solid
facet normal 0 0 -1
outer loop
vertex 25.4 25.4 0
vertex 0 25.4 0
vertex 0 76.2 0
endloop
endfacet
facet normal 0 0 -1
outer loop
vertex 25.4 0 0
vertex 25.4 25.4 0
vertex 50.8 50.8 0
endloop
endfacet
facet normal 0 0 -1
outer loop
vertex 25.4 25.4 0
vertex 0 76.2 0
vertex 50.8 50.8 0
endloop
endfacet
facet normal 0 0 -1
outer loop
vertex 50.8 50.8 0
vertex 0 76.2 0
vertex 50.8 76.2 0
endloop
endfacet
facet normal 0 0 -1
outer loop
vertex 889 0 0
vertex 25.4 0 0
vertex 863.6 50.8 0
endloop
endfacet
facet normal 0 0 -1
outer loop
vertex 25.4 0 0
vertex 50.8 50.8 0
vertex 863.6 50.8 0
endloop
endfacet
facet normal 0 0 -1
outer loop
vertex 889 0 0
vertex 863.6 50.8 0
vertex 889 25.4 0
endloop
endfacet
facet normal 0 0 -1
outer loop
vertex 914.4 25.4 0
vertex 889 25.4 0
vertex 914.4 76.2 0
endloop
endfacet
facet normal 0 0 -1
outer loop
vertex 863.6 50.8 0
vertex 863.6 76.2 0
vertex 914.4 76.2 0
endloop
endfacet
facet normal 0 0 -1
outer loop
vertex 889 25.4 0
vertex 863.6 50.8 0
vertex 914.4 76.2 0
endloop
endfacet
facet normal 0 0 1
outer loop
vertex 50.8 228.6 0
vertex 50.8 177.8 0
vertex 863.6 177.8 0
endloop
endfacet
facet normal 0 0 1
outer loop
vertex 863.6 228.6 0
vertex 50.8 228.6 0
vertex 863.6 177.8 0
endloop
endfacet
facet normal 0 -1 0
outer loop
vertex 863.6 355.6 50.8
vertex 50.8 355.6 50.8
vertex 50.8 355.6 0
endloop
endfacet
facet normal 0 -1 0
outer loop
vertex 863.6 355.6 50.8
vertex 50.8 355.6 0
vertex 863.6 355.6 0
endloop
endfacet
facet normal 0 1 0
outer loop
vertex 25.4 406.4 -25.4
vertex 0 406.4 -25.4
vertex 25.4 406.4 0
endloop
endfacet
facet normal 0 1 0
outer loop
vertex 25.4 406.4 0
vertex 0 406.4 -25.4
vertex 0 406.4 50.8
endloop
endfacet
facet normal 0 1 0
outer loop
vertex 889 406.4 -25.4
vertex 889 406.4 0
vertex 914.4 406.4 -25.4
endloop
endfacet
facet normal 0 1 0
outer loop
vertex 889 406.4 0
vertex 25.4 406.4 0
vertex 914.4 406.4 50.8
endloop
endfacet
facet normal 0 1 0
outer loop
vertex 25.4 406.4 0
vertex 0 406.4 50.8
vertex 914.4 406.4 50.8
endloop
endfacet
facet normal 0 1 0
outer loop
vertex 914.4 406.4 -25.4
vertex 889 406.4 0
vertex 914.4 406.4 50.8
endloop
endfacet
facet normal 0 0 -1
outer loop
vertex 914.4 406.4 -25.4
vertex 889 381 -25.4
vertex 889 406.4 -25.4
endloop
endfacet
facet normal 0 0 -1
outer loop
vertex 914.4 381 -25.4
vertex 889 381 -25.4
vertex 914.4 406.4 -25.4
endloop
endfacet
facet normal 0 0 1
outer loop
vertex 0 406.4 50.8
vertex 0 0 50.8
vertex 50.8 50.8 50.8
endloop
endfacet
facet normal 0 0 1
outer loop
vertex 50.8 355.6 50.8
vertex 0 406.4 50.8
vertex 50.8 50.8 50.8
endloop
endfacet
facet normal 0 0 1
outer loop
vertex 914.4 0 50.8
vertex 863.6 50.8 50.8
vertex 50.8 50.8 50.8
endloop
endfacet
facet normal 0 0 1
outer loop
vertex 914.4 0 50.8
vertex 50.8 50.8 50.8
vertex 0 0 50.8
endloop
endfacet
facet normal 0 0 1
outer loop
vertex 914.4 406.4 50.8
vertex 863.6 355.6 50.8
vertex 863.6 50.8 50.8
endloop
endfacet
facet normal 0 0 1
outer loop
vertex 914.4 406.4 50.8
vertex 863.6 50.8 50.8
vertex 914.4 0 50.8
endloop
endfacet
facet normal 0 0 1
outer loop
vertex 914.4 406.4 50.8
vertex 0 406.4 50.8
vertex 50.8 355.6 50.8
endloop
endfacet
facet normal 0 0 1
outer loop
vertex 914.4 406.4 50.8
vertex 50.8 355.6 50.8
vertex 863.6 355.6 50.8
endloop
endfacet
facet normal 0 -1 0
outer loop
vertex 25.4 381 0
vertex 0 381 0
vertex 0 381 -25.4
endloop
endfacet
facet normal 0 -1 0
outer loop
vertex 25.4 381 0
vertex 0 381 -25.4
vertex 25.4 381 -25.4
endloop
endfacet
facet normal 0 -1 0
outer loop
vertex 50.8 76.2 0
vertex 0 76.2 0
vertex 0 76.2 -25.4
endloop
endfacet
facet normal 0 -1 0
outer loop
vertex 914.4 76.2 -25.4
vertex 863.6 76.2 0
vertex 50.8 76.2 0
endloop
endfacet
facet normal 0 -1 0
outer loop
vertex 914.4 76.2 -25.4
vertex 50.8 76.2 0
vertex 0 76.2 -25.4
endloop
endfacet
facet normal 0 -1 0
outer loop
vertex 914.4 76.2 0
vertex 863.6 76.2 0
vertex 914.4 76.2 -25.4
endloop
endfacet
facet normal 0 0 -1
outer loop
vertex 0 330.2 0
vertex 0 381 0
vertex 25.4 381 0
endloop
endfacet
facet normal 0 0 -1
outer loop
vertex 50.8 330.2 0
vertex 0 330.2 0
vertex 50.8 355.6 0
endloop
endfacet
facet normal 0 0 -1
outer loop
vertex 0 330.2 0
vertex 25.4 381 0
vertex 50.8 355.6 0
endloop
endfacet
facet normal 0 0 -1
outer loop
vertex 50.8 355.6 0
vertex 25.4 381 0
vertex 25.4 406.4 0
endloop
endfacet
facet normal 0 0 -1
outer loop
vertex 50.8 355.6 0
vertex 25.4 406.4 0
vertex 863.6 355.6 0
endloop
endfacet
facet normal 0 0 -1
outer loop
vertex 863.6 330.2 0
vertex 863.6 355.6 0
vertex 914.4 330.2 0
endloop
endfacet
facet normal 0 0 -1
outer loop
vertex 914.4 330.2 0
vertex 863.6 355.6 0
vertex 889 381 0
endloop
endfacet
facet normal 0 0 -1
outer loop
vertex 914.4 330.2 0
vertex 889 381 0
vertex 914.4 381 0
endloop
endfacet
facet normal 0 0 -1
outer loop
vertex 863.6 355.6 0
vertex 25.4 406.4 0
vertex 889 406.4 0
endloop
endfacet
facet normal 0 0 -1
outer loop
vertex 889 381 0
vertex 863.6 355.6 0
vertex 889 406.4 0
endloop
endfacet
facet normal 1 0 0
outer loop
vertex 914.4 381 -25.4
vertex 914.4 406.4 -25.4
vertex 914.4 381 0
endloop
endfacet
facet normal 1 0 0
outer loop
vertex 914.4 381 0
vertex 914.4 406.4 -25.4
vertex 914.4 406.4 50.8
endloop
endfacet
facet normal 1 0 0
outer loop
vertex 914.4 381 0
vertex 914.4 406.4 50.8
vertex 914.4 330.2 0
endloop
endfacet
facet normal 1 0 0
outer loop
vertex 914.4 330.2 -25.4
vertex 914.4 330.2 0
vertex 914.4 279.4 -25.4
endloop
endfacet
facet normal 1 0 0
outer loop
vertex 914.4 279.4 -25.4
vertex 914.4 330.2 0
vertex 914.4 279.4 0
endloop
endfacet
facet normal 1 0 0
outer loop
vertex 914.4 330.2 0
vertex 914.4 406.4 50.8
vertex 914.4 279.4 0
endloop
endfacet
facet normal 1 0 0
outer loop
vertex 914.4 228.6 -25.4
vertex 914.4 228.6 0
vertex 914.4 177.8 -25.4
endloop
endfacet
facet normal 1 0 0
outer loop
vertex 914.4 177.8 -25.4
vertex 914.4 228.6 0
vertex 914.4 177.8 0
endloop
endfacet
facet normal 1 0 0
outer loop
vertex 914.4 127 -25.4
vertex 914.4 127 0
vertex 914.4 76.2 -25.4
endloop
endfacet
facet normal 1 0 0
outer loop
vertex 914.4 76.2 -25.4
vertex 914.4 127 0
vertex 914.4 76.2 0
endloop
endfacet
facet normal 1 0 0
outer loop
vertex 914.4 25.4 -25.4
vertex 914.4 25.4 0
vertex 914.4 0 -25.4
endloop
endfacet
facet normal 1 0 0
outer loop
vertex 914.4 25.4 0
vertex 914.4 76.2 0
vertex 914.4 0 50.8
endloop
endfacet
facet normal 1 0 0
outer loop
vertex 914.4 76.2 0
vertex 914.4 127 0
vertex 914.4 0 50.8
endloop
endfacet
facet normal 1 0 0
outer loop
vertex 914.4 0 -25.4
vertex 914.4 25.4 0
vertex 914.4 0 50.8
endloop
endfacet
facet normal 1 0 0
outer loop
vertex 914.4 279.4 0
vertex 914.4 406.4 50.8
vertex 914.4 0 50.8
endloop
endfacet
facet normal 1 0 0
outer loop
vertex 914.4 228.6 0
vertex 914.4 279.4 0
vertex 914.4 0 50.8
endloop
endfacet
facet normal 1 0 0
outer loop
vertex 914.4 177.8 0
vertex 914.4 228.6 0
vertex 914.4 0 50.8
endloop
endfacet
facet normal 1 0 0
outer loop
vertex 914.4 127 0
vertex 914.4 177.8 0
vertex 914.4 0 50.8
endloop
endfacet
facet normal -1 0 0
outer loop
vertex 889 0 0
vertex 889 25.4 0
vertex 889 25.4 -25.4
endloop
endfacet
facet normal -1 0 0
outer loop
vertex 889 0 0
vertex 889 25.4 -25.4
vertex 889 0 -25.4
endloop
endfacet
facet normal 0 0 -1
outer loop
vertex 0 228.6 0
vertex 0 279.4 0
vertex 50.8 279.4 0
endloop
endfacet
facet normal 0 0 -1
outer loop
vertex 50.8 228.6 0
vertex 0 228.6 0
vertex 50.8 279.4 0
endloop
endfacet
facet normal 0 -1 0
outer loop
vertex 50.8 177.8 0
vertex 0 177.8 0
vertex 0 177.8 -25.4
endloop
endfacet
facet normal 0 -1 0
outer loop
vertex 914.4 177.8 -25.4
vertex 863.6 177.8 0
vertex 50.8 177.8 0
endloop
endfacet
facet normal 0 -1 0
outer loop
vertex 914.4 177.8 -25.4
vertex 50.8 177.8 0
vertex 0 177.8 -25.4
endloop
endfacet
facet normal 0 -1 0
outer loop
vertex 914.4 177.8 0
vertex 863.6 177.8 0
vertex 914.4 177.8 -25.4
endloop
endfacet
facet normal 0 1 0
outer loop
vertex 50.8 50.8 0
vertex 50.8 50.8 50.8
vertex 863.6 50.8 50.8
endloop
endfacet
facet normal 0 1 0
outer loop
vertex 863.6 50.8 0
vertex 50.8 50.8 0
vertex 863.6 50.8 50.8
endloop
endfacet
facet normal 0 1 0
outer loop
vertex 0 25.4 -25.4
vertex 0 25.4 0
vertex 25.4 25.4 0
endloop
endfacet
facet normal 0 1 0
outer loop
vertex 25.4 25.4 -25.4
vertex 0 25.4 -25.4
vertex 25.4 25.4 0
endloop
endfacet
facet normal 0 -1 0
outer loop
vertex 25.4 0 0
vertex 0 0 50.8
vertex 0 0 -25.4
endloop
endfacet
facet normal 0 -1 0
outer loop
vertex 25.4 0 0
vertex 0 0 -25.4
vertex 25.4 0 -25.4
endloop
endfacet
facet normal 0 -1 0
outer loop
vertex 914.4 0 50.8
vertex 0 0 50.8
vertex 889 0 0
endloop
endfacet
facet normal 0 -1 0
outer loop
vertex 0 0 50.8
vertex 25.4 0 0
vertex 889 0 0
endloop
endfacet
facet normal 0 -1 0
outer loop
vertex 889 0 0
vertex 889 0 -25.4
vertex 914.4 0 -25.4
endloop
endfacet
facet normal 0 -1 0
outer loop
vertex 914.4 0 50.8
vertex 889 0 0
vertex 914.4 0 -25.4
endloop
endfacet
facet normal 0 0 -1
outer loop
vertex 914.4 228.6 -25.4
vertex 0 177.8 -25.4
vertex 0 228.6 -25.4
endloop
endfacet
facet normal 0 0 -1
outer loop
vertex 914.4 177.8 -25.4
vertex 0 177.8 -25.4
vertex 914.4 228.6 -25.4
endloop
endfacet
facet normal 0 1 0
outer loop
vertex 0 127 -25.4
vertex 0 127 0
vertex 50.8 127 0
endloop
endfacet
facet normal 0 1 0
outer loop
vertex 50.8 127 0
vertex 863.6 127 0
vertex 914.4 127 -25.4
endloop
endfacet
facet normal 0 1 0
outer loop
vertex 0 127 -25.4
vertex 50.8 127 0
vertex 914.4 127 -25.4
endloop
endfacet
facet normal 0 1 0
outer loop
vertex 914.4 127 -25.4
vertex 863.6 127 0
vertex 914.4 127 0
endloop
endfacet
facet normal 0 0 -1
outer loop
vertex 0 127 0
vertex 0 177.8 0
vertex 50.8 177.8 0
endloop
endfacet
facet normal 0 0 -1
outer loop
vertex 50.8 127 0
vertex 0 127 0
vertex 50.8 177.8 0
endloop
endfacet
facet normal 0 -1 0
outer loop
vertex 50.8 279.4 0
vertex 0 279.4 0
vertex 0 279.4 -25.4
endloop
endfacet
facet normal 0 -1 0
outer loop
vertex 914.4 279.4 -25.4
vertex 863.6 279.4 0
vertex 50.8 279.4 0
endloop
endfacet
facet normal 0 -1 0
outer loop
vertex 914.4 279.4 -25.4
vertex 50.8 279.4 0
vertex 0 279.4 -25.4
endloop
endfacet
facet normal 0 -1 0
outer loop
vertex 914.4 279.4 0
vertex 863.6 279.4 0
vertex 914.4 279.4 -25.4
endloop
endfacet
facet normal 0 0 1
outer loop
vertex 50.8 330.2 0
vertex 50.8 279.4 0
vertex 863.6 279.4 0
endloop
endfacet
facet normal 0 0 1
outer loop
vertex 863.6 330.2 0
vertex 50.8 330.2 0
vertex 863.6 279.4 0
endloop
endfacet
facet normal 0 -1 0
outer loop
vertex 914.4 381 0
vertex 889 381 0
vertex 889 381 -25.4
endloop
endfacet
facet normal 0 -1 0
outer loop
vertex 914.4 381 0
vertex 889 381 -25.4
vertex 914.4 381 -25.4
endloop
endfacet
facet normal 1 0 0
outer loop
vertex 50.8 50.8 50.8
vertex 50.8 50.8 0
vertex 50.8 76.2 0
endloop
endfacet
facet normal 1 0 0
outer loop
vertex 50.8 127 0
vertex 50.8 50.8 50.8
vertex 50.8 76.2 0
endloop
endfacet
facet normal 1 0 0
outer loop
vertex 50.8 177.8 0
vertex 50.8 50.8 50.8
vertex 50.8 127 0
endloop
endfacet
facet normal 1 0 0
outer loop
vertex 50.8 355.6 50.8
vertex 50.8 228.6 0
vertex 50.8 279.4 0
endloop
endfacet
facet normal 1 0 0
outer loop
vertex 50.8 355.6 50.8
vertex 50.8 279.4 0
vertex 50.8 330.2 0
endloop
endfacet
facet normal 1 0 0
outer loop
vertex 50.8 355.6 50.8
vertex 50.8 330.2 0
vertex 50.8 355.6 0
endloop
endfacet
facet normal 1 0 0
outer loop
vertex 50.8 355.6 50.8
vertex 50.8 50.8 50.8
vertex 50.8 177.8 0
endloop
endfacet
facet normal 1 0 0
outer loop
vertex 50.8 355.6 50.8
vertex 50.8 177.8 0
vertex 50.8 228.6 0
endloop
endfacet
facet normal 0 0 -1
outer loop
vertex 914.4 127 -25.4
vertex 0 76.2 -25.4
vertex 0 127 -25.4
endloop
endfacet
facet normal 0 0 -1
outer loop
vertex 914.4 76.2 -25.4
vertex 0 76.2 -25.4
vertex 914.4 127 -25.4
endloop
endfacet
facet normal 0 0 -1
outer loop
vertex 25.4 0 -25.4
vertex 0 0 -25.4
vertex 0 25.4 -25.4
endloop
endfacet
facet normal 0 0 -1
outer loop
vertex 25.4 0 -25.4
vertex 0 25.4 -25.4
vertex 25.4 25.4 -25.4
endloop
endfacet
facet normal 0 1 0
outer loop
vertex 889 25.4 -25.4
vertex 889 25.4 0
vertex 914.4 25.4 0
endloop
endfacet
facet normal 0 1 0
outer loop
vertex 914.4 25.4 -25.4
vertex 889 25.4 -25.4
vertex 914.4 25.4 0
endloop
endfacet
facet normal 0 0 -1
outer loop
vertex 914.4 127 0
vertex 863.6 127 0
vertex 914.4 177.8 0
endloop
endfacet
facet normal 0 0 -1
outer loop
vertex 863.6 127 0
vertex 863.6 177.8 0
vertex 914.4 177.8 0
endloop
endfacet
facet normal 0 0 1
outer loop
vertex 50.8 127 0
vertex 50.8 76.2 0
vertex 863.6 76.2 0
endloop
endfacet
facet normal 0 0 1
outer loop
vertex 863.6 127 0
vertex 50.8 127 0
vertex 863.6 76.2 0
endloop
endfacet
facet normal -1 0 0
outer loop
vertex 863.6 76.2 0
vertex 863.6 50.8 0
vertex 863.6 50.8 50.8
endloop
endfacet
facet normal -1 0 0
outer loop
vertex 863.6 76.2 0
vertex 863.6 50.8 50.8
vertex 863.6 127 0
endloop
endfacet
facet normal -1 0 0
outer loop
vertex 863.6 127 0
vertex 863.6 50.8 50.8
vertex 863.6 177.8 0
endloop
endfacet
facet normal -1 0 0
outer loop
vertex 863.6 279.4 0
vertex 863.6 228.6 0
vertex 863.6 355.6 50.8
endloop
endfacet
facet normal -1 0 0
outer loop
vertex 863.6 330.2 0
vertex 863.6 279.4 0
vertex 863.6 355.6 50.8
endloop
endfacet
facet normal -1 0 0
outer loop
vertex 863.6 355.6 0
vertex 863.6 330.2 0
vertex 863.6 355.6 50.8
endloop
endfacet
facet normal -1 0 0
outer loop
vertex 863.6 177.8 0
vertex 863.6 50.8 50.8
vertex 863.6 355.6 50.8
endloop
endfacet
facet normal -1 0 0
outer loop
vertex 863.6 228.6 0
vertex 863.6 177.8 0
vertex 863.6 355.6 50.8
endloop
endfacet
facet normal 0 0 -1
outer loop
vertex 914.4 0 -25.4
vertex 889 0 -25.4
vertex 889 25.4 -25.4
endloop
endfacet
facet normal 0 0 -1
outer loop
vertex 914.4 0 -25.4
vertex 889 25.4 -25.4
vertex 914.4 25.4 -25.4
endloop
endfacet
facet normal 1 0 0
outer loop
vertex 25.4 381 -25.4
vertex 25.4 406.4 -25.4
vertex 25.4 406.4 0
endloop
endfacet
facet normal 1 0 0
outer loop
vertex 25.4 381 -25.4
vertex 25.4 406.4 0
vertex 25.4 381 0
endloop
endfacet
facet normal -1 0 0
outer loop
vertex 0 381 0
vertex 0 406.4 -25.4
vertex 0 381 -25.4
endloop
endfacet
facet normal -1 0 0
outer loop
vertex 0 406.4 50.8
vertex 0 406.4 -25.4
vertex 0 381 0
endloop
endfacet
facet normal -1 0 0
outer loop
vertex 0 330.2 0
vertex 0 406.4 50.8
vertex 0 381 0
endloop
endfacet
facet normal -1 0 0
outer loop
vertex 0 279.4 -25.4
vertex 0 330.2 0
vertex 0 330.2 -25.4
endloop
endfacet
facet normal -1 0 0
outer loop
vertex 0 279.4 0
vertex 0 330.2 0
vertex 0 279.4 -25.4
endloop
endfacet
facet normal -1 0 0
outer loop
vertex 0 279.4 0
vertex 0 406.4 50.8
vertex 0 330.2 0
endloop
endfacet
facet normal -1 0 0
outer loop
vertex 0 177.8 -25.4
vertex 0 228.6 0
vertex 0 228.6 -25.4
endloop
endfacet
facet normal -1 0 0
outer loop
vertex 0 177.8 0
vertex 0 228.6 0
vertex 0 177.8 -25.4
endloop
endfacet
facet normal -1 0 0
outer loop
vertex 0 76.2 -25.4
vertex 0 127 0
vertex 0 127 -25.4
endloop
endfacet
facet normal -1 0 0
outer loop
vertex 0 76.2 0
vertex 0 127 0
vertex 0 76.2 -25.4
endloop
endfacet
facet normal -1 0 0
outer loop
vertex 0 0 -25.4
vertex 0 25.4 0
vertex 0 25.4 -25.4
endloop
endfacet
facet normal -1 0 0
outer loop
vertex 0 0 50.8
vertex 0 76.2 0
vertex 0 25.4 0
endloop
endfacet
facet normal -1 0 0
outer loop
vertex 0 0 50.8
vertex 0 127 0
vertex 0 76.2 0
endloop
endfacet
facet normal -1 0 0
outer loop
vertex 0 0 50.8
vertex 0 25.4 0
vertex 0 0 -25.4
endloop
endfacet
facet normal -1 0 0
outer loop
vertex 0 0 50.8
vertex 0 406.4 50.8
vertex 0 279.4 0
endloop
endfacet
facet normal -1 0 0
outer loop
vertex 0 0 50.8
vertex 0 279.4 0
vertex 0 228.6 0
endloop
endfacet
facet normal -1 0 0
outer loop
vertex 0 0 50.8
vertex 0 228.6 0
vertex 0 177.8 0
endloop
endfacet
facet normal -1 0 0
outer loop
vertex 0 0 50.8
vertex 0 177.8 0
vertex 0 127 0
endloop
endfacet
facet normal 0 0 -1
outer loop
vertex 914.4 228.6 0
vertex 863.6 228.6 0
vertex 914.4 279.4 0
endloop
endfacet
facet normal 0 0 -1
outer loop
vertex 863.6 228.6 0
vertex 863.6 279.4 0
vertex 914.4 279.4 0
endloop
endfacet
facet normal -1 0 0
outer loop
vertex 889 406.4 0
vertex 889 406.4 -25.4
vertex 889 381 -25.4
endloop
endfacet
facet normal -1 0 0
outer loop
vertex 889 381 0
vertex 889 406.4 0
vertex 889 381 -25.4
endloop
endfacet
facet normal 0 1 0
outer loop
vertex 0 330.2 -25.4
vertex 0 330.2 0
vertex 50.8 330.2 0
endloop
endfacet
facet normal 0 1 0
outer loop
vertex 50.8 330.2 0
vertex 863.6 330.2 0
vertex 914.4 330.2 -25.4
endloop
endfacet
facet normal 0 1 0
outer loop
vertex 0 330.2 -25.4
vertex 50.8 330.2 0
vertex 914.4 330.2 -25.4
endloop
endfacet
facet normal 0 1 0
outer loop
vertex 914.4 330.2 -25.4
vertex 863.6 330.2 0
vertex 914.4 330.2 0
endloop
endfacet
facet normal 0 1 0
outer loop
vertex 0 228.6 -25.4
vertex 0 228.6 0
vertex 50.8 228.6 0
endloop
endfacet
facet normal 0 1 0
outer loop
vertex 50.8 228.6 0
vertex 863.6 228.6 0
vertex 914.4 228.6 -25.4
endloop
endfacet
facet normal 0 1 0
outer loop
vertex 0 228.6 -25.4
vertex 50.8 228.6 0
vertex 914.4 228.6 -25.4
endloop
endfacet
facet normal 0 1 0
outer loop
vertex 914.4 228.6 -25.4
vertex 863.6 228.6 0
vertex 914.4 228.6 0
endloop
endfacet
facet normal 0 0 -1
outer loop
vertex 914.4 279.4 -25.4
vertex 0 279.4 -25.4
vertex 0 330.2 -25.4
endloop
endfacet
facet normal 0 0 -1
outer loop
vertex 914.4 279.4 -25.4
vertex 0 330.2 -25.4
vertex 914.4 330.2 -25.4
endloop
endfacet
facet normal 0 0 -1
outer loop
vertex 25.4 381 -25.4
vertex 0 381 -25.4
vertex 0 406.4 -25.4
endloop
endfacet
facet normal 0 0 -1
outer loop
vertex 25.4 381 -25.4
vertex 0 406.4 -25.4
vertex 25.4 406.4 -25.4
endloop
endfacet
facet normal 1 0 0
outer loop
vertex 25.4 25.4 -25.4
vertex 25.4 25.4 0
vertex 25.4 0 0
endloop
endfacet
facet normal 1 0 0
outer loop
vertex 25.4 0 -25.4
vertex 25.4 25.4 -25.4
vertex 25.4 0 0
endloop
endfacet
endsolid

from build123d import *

# Parameters (mm, degrees)
SKETCH_W     = 914.4
SKETCH_H     = 406.4
PAD_DEPTH    = 50.8
SKETCH001_W  = 812.8
SKETCH001_H  = 304.8
POCKET_DEPTH = 50.801
SKETCH002_W  = 914.4
SKETCH002_H  = 50.8
PAD001_DEPTH = 25.4
SKETCH003_W  = 25.4
SKETCH003_H  = 25.4
PAD002_DEPTH = 25.4


with BuildPart() as part:
    # Sketch → Pad (new body)
    with BuildSketch(Plane.XY):
        with Locations((457.2, 203.2)):
            Rectangle(SKETCH_W, SKETCH_H)
    extrude(amount=PAD_DEPTH)

    # Sketch001 (on Face6 of Pad) → Pocket (cut, through all)
    with BuildSketch(Plane.XY.offset(50.8)):
        with Locations((457.2, 203.2)):
            Rectangle(SKETCH001_W, SKETCH001_H)
    extrude(amount=-POCKET_DEPTH, mode=Mode.SUBTRACT)

    # Sketch002 (on Face4 of Pocket) → Pad001 (join)
    with BuildSketch(Plane(origin=(0, 0, 0), x_dir=(1, 0, 0), z_dir=(0, 0, -1))):
        with Locations((457.2, -101.6)):
            Rectangle(SKETCH002_W, SKETCH002_H)
        with Locations((457.2, -203.2)):
            Rectangle(SKETCH002_W, SKETCH002_H)
        with Locations((457.2, -304.8)):
            Rectangle(SKETCH002_W, SKETCH002_H)
    extrude(amount=PAD001_DEPTH)

    # Sketch003 (on Face4 of Pad001) → Pad002 (join)
    with BuildSketch(Plane(origin=(0, 0, 0), x_dir=(1, 0, 0), z_dir=(0, 0, -1))):
        with Locations((12.7, -393.7)):
            Rectangle(SKETCH003_W, SKETCH003_H)
        with Locations((901.7, -393.7)):
            Rectangle(SKETCH003_W, SKETCH003_H)
        with Locations((901.7, -12.7)):
            Rectangle(SKETCH003_W, SKETCH003_H)
        with Locations((12.7, -12.7)):
            Rectangle(SKETCH003_W, SKETCH003_H)
    extrude(amount=PAD002_DEPTH)


solid = part.part
